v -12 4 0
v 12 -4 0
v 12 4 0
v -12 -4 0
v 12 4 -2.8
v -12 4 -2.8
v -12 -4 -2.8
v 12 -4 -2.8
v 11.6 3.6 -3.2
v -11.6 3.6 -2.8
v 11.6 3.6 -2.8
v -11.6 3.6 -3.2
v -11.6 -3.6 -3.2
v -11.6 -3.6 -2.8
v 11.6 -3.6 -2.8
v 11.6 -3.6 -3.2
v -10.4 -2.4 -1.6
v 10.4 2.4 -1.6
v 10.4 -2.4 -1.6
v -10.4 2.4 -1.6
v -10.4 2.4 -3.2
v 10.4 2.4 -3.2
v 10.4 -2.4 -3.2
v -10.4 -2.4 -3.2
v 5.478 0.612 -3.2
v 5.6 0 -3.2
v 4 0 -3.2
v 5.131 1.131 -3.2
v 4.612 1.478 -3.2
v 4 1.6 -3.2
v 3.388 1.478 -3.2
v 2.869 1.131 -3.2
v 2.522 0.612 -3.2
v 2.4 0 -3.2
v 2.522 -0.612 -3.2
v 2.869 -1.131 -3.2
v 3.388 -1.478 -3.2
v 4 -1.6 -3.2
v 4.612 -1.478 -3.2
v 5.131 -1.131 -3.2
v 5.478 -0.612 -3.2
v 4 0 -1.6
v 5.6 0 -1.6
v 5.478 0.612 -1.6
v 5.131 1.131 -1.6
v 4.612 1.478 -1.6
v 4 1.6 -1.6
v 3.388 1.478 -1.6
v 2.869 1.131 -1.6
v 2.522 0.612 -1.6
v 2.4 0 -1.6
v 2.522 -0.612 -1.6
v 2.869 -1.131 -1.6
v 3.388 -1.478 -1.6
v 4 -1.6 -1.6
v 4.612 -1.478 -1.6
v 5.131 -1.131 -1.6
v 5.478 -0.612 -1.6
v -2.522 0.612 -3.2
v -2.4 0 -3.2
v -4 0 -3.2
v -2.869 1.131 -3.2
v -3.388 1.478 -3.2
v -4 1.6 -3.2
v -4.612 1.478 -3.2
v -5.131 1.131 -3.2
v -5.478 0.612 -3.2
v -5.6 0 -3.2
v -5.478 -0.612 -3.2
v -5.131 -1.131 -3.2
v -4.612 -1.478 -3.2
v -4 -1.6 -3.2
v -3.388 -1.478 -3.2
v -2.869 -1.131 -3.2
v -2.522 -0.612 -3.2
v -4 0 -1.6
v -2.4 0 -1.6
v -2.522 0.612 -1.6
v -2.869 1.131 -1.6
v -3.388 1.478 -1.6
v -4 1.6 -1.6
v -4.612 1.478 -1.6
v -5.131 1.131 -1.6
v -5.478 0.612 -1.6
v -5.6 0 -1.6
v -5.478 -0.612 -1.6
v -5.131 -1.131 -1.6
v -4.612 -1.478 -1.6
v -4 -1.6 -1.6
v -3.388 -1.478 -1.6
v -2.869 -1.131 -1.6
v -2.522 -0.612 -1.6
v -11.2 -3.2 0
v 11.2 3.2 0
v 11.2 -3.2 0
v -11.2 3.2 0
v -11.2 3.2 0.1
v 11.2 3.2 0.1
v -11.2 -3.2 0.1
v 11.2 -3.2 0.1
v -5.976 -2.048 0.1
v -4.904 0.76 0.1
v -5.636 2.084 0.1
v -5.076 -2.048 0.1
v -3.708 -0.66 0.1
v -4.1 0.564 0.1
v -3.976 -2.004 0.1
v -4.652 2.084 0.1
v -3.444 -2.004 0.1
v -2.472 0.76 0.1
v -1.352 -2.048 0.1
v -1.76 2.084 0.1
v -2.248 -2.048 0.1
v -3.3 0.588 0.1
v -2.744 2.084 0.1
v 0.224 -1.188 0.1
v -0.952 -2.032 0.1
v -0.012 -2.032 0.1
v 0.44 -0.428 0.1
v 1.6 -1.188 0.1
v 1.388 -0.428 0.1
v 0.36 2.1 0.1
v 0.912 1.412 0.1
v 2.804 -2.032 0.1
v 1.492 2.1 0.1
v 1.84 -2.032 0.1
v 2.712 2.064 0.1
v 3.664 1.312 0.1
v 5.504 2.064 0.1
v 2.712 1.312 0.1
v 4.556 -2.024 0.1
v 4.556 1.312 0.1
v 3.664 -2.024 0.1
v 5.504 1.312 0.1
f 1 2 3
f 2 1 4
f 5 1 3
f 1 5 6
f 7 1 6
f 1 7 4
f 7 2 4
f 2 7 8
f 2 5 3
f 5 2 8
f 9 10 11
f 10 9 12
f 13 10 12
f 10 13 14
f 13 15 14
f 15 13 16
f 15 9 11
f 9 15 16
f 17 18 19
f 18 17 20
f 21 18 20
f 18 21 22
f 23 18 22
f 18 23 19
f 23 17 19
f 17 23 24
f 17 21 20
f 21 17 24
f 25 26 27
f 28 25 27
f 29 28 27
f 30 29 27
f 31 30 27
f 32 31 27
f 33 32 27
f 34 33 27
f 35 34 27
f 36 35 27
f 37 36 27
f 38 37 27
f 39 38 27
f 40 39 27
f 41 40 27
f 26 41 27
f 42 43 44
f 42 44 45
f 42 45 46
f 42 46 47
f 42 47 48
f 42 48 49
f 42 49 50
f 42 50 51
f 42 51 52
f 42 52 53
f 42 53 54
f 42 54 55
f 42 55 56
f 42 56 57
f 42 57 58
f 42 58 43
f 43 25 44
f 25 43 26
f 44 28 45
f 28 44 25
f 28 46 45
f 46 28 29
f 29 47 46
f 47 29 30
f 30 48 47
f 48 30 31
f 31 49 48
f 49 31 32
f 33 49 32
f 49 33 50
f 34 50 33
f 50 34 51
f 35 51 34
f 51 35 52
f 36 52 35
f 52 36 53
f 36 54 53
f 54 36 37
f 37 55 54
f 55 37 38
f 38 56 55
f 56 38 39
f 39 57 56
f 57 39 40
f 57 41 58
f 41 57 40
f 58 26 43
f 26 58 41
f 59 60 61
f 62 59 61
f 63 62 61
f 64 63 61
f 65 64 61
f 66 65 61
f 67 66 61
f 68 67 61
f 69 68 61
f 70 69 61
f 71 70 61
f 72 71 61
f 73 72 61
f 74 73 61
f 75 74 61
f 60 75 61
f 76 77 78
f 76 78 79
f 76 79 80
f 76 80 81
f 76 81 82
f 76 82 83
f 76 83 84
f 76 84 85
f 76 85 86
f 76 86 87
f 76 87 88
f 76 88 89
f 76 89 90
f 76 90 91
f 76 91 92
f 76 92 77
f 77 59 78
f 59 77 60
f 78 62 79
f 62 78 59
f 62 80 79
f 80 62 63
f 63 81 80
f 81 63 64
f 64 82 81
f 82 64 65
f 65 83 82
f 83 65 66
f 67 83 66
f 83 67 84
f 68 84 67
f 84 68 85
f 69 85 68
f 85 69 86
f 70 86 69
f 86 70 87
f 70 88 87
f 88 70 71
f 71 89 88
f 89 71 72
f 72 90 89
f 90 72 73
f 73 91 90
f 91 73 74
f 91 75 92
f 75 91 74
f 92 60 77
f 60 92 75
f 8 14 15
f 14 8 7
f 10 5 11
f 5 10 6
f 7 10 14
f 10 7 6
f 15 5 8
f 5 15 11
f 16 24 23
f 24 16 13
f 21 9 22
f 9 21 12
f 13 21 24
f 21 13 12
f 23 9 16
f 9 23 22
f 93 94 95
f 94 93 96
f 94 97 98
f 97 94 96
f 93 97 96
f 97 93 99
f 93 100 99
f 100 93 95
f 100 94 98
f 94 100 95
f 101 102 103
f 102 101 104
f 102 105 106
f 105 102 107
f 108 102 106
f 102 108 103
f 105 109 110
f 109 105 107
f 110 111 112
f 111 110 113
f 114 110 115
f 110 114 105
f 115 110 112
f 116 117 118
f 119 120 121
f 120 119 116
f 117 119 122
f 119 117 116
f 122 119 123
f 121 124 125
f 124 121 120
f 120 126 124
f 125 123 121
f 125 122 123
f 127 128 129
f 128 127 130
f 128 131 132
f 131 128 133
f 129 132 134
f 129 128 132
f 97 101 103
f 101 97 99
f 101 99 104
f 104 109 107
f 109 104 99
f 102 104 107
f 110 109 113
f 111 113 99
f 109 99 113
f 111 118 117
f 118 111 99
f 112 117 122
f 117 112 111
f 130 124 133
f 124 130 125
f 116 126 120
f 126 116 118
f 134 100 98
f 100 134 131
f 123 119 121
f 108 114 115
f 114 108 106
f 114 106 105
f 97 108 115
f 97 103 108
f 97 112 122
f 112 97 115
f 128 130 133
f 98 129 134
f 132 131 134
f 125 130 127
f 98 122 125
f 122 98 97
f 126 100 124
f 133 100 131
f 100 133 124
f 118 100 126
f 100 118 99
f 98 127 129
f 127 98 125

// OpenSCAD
// file: ../p/4-4edge.scad
use <../lib.scad>
function ldraw_lib__4_4edge() = [
// 0 Circle 1.0
// 0 Name: 4-4edge.dat
// 0 Author: James Jessiman
// 0 !LDRAW_ORG Primitive UPDATE 2017-01
// 0 !LICENSE Licensed under CC BY 2.0 and CC BY 4.0 : see CAreadme.txt
// 
// 0 BFC CERTIFY CCW
  [0,"BFC","CERTIFY"],
  [0,"BFC","CCW"],
// 
// 0 !HISTORY 1998-12-15 [PTadmin] Official Update 1998-10
// 0 !HISTORY 2005-12-28 [PTadmin] Official Update 2005-01
// 0 !HISTORY 2007-06-24 [PTadmin] Header formatted for Contributor Agreement
// 0 !HISTORY 2008-07-01 [PTadmin] Official Update 2008-01
// 0 !HISTORY 2017-01-15 [Steffen] BFCed
// 0 !HISTORY 2017-12-30 [PTadmin] Official Update 2017-01
// 
// 
// 2 24 1 0 0 0.9239 0 0.3827
  [2,24,1,0,0,0.9239,0,0.3827],
// 2 24 0.9239 0 0.3827 0.7071 0 0.7071
  [2,24,0.9239,0,0.3827,0.7071,0,0.7071],
// 2 24 0.7071 0 0.7071 0.3827 0 0.9239
  [2,24,0.7071,0,0.7071,0.3827,0,0.9239],
// 2 24 0.3827 0 0.9239 0 0 1
  [2,24,0.3827,0,0.9239,0,0,1],
// 2 24 0 0 1 -0.3827 0 0.9239
  [2,24,0,0,1,-0.3827,0,0.9239],
// 2 24 -0.3827 0 0.9239 -0.7071 0 0.7071
  [2,24,-0.3827,0,0.9239,-0.7071,0,0.7071],
// 2 24 -0.7071 0 0.7071 -0.9239 0 0.3827
  [2,24,-0.7071,0,0.7071,-0.9239,0,0.3827],
// 2 24 -0.9239 0 0.3827 -1 0 -0
  [2,24,-0.9239,0,0.3827,-1,0,-0],
// 2 24 -1 0 -0 -0.9239 0 -0.3827
  [2,24,-1,0,-0,-0.9239,0,-0.3827],
// 2 24 -0.9239 0 -0.3827 -0.7071 0 -0.7071
  [2,24,-0.9239,0,-0.3827,-0.7071,0,-0.7071],
// 2 24 -0.7071 0 -0.7071 -0.3827 0 -0.9239
  [2,24,-0.7071,0,-0.7071,-0.3827,0,-0.9239],
// 2 24 -0.3827 0 -0.9239 0 0 -1
  [2,24,-0.3827,0,-0.9239,0,0,-1],
// 2 24 0 0 -1 0.3827 0 -0.9239
  [2,24,0,0,-1,0.3827,0,-0.9239],
// 2 24 0.3827 0 -0.9239 0.7071 0 -0.7071
  [2,24,0.3827,0,-0.9239,0.7071,0,-0.7071],
// 2 24 0.7071 0 -0.7071 0.9239 0 -0.3827
  [2,24,0.7071,0,-0.7071,0.9239,0,-0.3827],
// 2 24 0.9239 0 -0.3827 1 0 0
  [2,24,0.9239,0,-0.3827,1,0,0],
];
module ldraw_lib__4_4edge(step=0, col=false, unit=2/5, alt=false, line=0.2, solid=!$preview)
    makepoly(ldraw_lib__4_4edge(), step=step, col=col, unit=unit, alt=alt, line=line, solid=solid);
ldraw_lib__4_4edge(line=0.2);
// file: ../p/4-4disc.scad
use <../lib.scad>
function ldraw_lib__4_4disc() = [
// 0 Disc 1.0
// 0 Name: 4-4disc.dat
// 0 Author: James Jessiman
// 0 !LDRAW_ORG Primitive UPDATE 2002-02
// 0 !LICENSE Licensed under CC BY 2.0 and CC BY 4.0 : see CAreadme.txt
// 
// 0 BFC CERTIFY CCW
  [0,"BFC","CERTIFY"],
  [0,"BFC","CCW"],
// 
// 0 !HISTORY 1998-12-15 [PTadmin] Official Update 1998-10
// 0 !HISTORY 2002-03-23 [sbliss] Added BFC statement
// 0 !HISTORY 2002-04-25 [PTadmin] Official Update 2002-02
// 0 !HISTORY 2007-06-24 [PTadmin] Header formatted for Contributor Agreement
// 0 !HISTORY 2008-07-01 [PTadmin] Official Update 2008-01
// 
// 
// 3 16 0 0 0 1 0 0 0.9239 0 0.3827
  [3,16,0,0,0,1,0,0,0.9239,0,0.3827],
// 3 16 0 0 0 0.9239 0 0.3827 0.7071 0 0.7071
  [3,16,0,0,0,0.9239,0,0.3827,0.7071,0,0.7071],
// 3 16 0 0 0 0.7071 0 0.7071 0.3827 0 0.9239
  [3,16,0,0,0,0.7071,0,0.7071,0.3827,0,0.9239],
// 3 16 0 0 0 0.3827 0 0.9239 0 0 1
  [3,16,0,0,0,0.3827,0,0.9239,0,0,1],
// 3 16 0 0 0 0 0 1 -0.3827 0 0.9239
  [3,16,0,0,0,0,0,1,-0.3827,0,0.9239],
// 3 16 0 0 0 -0.3827 0 0.9239 -0.7071 0 0.7071
  [3,16,0,0,0,-0.3827,0,0.9239,-0.7071,0,0.7071],
// 3 16 0 0 0 -0.7071 0 0.7071 -0.9239 0 0.3827
  [3,16,0,0,0,-0.7071,0,0.7071,-0.9239,0,0.3827],
// 3 16 0 0 0 -0.9239 0 0.3827 -1 0 -0
  [3,16,0,0,0,-0.9239,0,0.3827,-1,0,-0],
// 3 16 0 0 0 -1 0 -0 -0.9239 0 -0.3827
  [3,16,0,0,0,-1,0,-0,-0.9239,0,-0.3827],
// 3 16 0 0 0 -0.9239 0 -0.3827 -0.7071 0 -0.7071
  [3,16,0,0,0,-0.9239,0,-0.3827,-0.7071,0,-0.7071],
// 3 16 0 0 0 -0.7071 0 -0.7071 -0.3827 0 -0.9239
  [3,16,0,0,0,-0.7071,0,-0.7071,-0.3827,0,-0.9239],
// 3 16 0 0 0 -0.3827 0 -0.9239 0 0 -1
  [3,16,0,0,0,-0.3827,0,-0.9239,0,0,-1],
// 3 16 0 0 0 0 0 -1 0.3827 0 -0.9239
  [3,16,0,0,0,0,0,-1,0.3827,0,-0.9239],
// 3 16 0 0 0 0.3827 0 -0.9239 0.7071 0 -0.7071
  [3,16,0,0,0,0.3827,0,-0.9239,0.7071,0,-0.7071],
// 3 16 0 0 0 0.7071 0 -0.7071 0.9239 0 -0.3827
  [3,16,0,0,0,0.7071,0,-0.7071,0.9239,0,-0.3827],
// 3 16 0 0 0 0.9239 0 -0.3827 1 0 0
  [3,16,0,0,0,0.9239,0,-0.3827,1,0,0],
// 0
];
module ldraw_lib__4_4disc(step=0, col=false, unit=2/5, alt=false, line=0.2, solid=!$preview)
    makepoly(ldraw_lib__4_4disc(), step=step, col=col, unit=unit, alt=alt, line=line, solid=solid);
ldraw_lib__4_4disc(line=0.2);
// file: ../p/4-4cyli.scad
use <../lib.scad>
$fa=1; $fs=0.2;
function ldraw_lib__4_4cyli(realsolid=false) = [
// 0 Cylinder 1.0
// 0 Name: 4-4cyli.dat
// 0 Author: James Jessiman
// 0 !LDRAW_ORG Primitive UPDATE 2005-01
// 0 !LICENSE Licensed under CC BY 2.0 and CC BY 4.0 : see CAreadme.txt
// 
// 0 BFC CERTIFY CCW
  [0,"BFC","CERTIFY"],
  [0,"BFC","CCW"],
// 
// 0 !HISTORY 1998-12-15 [PTadmin] Official Update 1998-10
// 0 !HISTORY 2002-03-23 [sbliss] Added BFC statement; merged headers from files in distributions LDraw 0.27 and Complete.
// 0 !HISTORY 2002-04-25 [PTadmin] Official Update 2002-02
// 0 !HISTORY 2004-12-14 [guyvivan] BFC CCW
// 0 !HISTORY 2005-12-28 [PTadmin] Official Update 2005-01
// 0 !HISTORY 2007-06-24 [PTadmin] Header formatted for Contributor Agreement
// 0 !HISTORY 2008-07-01 [PTadmin] Official Update 2008-01
// 
// 
// 4 16 1 1 0 0.9239 1 0.3827 0.9239 0 0.3827 1 0 0
  [4,16,1,1,0,0.9239,1,0.3827,0.9239,0,0.3827,1,0,0],
// 5 24 1 0 0 1 1 0 0.9239 0 0.3827 0.9239 0 -0.3827
  [5,24,1,0,0,1,1,0,0.9239,0,0.3827,0.9239,0,-0.3827],
// 4 16 0.9239 1 0.3827 0.7071 1 0.7071 0.7071 0 0.7071 0.9239 0 0.3827
  [4,16,0.9239,1,0.3827,0.7071,1,0.7071,0.7071,0,0.7071,0.9239,0,0.3827],
// 5 24 0.9239 0 0.3827 0.9239 1 0.3827 0.7071 0 0.7071 1 0 0
  [5,24,0.9239,0,0.3827,0.9239,1,0.3827,0.7071,0,0.7071,1,0,0],
// 4 16 0.7071 1 0.7071 0.3827 1 0.9239 0.3827 0 0.9239 0.7071 0 0.7071
  [4,16,0.7071,1,0.7071,0.3827,1,0.9239,0.3827,0,0.9239,0.7071,0,0.7071],
// 5 24 0.7071 0 0.7071 0.7071 1 0.7071 0.3827 0 0.9239 0.9239 0 0.3827
  [5,24,0.7071,0,0.7071,0.7071,1,0.7071,0.3827,0,0.9239,0.9239,0,0.3827],
// 4 16 0.3827 1 0.9239 0 1 1 0 0 1 0.3827 0 0.9239
  [4,16,0.3827,1,0.9239,0,1,1,0,0,1,0.3827,0,0.9239],
// 5 24 0.3827 0 0.9239 0.3827 1 0.9239 0 0 1 0.7071 0 0.7071
  [5,24,0.3827,0,0.9239,0.3827,1,0.9239,0,0,1,0.7071,0,0.7071],
// 4 16 0 1 1 -0.3827 1 0.9239 -0.3827 0 0.9239 0 0 1
  [4,16,0,1,1,-0.3827,1,0.9239,-0.3827,0,0.9239,0,0,1],
// 5 24 0 0 1 0 1 1 -0.3827 0 0.9239 0.3827 0 0.9239
  [5,24,0,0,1,0,1,1,-0.3827,0,0.9239,0.3827,0,0.9239],
// 4 16 -0.3827 1 0.9239 -0.7071 1 0.7071 -0.7071 0 0.7071 -0.3827 0 0.9239
  [4,16,-0.3827,1,0.9239,-0.7071,1,0.7071,-0.7071,0,0.7071,-0.3827,0,0.9239],
// 5 24 -0.3827 0 0.9239 -0.3827 1 0.9239 -0.7071 0 0.7071 0 0 1
  [5,24,-0.3827,0,0.9239,-0.3827,1,0.9239,-0.7071,0,0.7071,0,0,1],
// 4 16 -0.7071 1 0.7071 -0.9239 1 0.3827 -0.9239 0 0.3827 -0.7071 0 0.7071
  [4,16,-0.7071,1,0.7071,-0.9239,1,0.3827,-0.9239,0,0.3827,-0.7071,0,0.7071],
// 5 24 -0.7071 0 0.7071 -0.7071 1 0.7071 -0.9239 0 0.3827 -0.3827 0 0.9239
  [5,24,-0.7071,0,0.7071,-0.7071,1,0.7071,-0.9239,0,0.3827,-0.3827,0,0.9239],
// 4 16 -0.9239 1 0.3827 -1 1 0 -1 0 0 -0.9239 0 0.3827
  [4,16,-0.9239,1,0.3827,-1,1,0,-1,0,0,-0.9239,0,0.3827],
// 5 24 -0.9239 0 0.3827 -0.9239 1 0.3827 -1 0 0 -0.7071 0 0.7071
  [5,24,-0.9239,0,0.3827,-0.9239,1,0.3827,-1,0,0,-0.7071,0,0.7071],
// 4 16 -1 1 0 -0.9239 1 -0.3827 -0.9239 0 -0.3827 -1 0 0
  [4,16,-1,1,0,-0.9239,1,-0.3827,-0.9239,0,-0.3827,-1,0,0],
// 5 24 -1 0 0 -1 1 0 -0.9239 0 -0.3827 -0.9239 0 0.3827
  [5,24,-1,0,0,-1,1,0,-0.9239,0,-0.3827,-0.9239,0,0.3827],
// 4 16 -0.9239 1 -0.3827 -0.7071 1 -0.7071 -0.7071 0 -0.7071 -0.9239 0 -0.3827
  [4,16,-0.9239,1,-0.3827,-0.7071,1,-0.7071,-0.7071,0,-0.7071,-0.9239,0,-0.3827],
// 5 24 -0.9239 0 -0.3827 -0.9239 1 -0.3827 -0.7071 0 -0.7071 -1 0 0
  [5,24,-0.9239,0,-0.3827,-0.9239,1,-0.3827,-0.7071,0,-0.7071,-1,0,0],
// 4 16 -0.7071 1 -0.7071 -0.3827 1 -0.9239 -0.3827 0 -0.9239 -0.7071 0 -0.7071
  [4,16,-0.7071,1,-0.7071,-0.3827,1,-0.9239,-0.3827,0,-0.9239,-0.7071,0,-0.7071],
// 5 24 -0.7071 0 -0.7071 -0.7071 1 -0.7071 -0.3827 0 -0.9239 -0.9239 0 -0.3827
  [5,24,-0.7071,0,-0.7071,-0.7071,1,-0.7071,-0.3827,0,-0.9239,-0.9239,0,-0.3827],
// 4 16 -0.3827 1 -0.9239 0 1 -1 0 0 -1 -0.3827 0 -0.9239
  [4,16,-0.3827,1,-0.9239,0,1,-1,0,0,-1,-0.3827,0,-0.9239],
// 5 24 -0.3827 0 -0.9239 -0.3827 1 -0.9239 0 0 -1 -0.7071 0 -0.7071
  [5,24,-0.3827,0,-0.9239,-0.3827,1,-0.9239,0,0,-1,-0.7071,0,-0.7071],
// 4 16 0 1 -1 0.3827 1 -0.9239 0.3827 0 -0.9239 0 0 -1
  [4,16,0,1,-1,0.3827,1,-0.9239,0.3827,0,-0.9239,0,0,-1],
// 5 24 0 0 -1 0 1 -1 0.3827 0 -0.9239 -0.3827 0 -0.9239
  [5,24,0,0,-1,0,1,-1,0.3827,0,-0.9239,-0.3827,0,-0.9239],
// 4 16 0.3827 1 -0.9239 0.7071 1 -0.7071 0.7071 0 -0.7071 0.3827 0 -0.9239
  [4,16,0.3827,1,-0.9239,0.7071,1,-0.7071,0.7071,0,-0.7071,0.3827,0,-0.9239],
// 5 24 0.3827 0 -0.9239 0.3827 1 -0.9239 0.7071 0 -0.7071 0 0 -1
  [5,24,0.3827,0,-0.9239,0.3827,1,-0.9239,0.7071,0,-0.7071,0,0,-1],
// 4 16 0.7071 1 -0.7071 0.9239 1 -0.3827 0.9239 0 -0.3827 0.7071 0 -0.7071
  [4,16,0.7071,1,-0.7071,0.9239,1,-0.3827,0.9239,0,-0.3827,0.7071,0,-0.7071],
// 5 24 0.7071 0 -0.7071 0.7071 1 -0.7071 0.9239 0 -0.3827 0.3827 0 -0.9239
  [5,24,0.7071,0,-0.7071,0.7071,1,-0.7071,0.9239,0,-0.3827,0.3827,0,-0.9239],
// 4 16 0.9239 1 -0.3827 1 1 0 1 0 0 0.9239 0 -0.3827
  [4,16,0.9239,1,-0.3827,1,1,0,1,0,0,0.9239,0,-0.3827],
// 5 24 0.9239 0 -0.3827 0.9239 1 -0.3827 1 0 0 0.7071 0 -0.7071
  [5,24,0.9239,0,-0.3827,0.9239,1,-0.3827,1,0,0,0.7071,0,-0.7071],
// 0
];
module ldraw_lib__4_4cyli(step=0, col=false, unit=2/5, alt=false, line=0.2, solid=!$preview)
    makepoly(ldraw_lib__4_4cyli(solid), step=step, col=col, unit=unit, alt=alt, line=line, solid=solid);
ldraw_lib__4_4cyli(line=0.2);
// file: ../p/stud3.scad
use <../lib.scad>
use <4-4cyli.scad>
use <4-4disc.scad>
use <4-4edge.scad>
function ldraw_lib__stud3() = [
// 0 Stud Tube Solid
// 0 Name: stud3.dat
// 0 Author: James Jessiman
// 0 !LDRAW_ORG Primitive UPDATE 2012-01
// 0 !LICENSE Licensed under CC BY 4.0 : see CAreadme.txt
// 
// 0 BFC CERTIFY CCW
  [0,"BFC","CERTIFY"],
  [0,"BFC","CCW"],
// 
// 0 !HISTORY 2002-04-04 [sbliss] Modified for BFC compliance
// 0 !HISTORY 2002-04-25 [PTadmin] Official Update 2002-02
// 0 !HISTORY 2007-06-24 [PTadmin] Header formatted for Contributor Agreement
// 0 !HISTORY 2008-07-01 [PTadmin] Official Update 2008-01
// 0 !HISTORY 2012-02-16 [Philo] Changed to CCW
// 0 !HISTORY 2012-03-30 [PTadmin] Official Update 2012-01
// 
// 
// 1 16 0 -4 0 4 0 0 0 1 0 0 0 4 4-4edge.dat
  [1,16,0,-4,0,4,0,0,0,1,0,0,0,4, ldraw_lib__4_4edge()],
// 1 16 0 0 0 4 0 0 0 1 0 0 0 4 4-4edge.dat
  [1,16,0,0,0,4,0,0,0,1,0,0,0,4, ldraw_lib__4_4edge()],
// 1 16 0 -4 0 4 0 0 0 1 0 0 0 4 4-4disc.dat
  [1,16,0,-4,0,4,0,0,0,1,0,0,0,4, ldraw_lib__4_4disc()],
  [-1,16,0,0,0,4,0,0,0,-1,0,0,0,4, ldraw_lib__4_4disc()],
// 1 16 0 -4 0 4 0 0 0 4 0 0 0 4 4-4cyli.dat
  [1,16,0,-4,0,4,0,0,0,4,0,0,0,4, ldraw_lib__4_4cyli()],
];
module ldraw_lib__stud3(step=0, col=false, unit=2/5, alt=false, line=0.2, solid=!$preview)
    makepoly(ldraw_lib__stud3(), step=step, col=col, unit=unit, alt=alt, line=line, solid=solid);
ldraw_lib__stud3(line=0.2);
// file: ../p/box5.scad
use <../lib.scad>
function ldraw_lib__box5() = [
// 0 Box with 5 Faces and All Edges
// 0 Name: box5.dat
// 0 Author: James Jessiman
// 0 !LDRAW_ORG Primitive UPDATE 2012-01
// 0 !LICENSE Licensed under CC BY 2.0 and CC BY 4.0 : see CAreadme.txt
// 
// 0 BFC CERTIFY CCW
  [0,"BFC","CERTIFY"],
  [0,"BFC","CCW"],
// 
// 0 !HISTORY 2002-04-03 [sbliss] Modified for BFC compliance
// 0 !HISTORY 2002-04-25 [PTadmin] Official Update 2002-02
// 0 !HISTORY 2007-06-24 [PTadmin] Header formatted for Contributor Agreement
// 0 !HISTORY 2008-07-01 [PTadmin] Official Update 2008-01
// 0 !HISTORY 2012-02-16 [Philo] Changed to CCW
// 0 !HISTORY 2012-03-30 [PTadmin] Official Update 2012-01
// 
// 
// 2 24 1 1 1 -1 1 1
  [2,24,1,1,1,-1,1,1],
// 2 24 -1 1 1 -1 1 -1
  [2,24,-1,1,1,-1,1,-1],
// 2 24 -1 1 -1 1 1 -1
  [2,24,-1,1,-1,1,1,-1],
// 2 24 1 1 -1 1 1 1
  [2,24,1,1,-1,1,1,1],
// 2 24 1 0 1 -1 0 1
  [2,24,1,0,1,-1,0,1],
// 2 24 -1 0 1 -1 0 -1
  [2,24,-1,0,1,-1,0,-1],
// 2 24 -1 0 -1 1 0 -1
  [2,24,-1,0,-1,1,0,-1],
// 2 24 1 0 -1 1 0 1
  [2,24,1,0,-1,1,0,1],
// 2 24 1 0 1 1 1 1
  [2,24,1,0,1,1,1,1],
// 2 24 -1 0 1 -1 1 1
  [2,24,-1,0,1,-1,1,1],
// 2 24 1 0 -1 1 1 -1
  [2,24,1,0,-1,1,1,-1],
// 2 24 -1 0 -1 -1 1 -1
  [2,24,-1,0,-1,-1,1,-1],
// 4 16 -1 1 1 1 1 1 1 1 -1 -1 1 -1
  [4,16,-1,1,1,1,1,1,1,1,-1,-1,1,-1],
// 4 16 -1 1 1 -1 0 1 1 0 1 1 1 1
  [4,16,-1,1,1,-1,0,1,1,0,1,1,1,1],
// 4 16 -1 1 -1 -1 0 -1 -1 0 1 -1 1 1
  [4,16,-1,1,-1,-1,0,-1,-1,0,1,-1,1,1],
// 4 16 1 1 -1 1 0 -1 -1 0 -1 -1 1 -1
  [4,16,1,1,-1,1,0,-1,-1,0,-1,-1,1,-1],
// 4 16 1 1 1 1 0 1 1 0 -1 1 1 -1
  [4,16,1,1,1,1,0,1,1,0,-1,1,1,-1],
];
makepoly(ldraw_lib__box5(), line=0.2);
// file: ../p/box4.scad
use <../lib.scad>
function ldraw_lib__box4() = [
// 0 Box with 4 Faces (2 Parallel Pairs) and All Edges
// 0 Name: box4.dat
// 0 Author: James Jessiman
// 0 !LDRAW_ORG Primitive UPDATE 2012-01
// 0 !LICENSE Licensed under CC BY 4.0 : see CAreadme.txt
// 
// 0 BFC CERTIFY CCW
  [0,"BFC","CERTIFY"],
  [0,"BFC","CCW"],
// 
// 0 !HISTORY 2002-04-03 [sbliss] Modified for BFC compliance
// 0 !HISTORY 2002-04-25 [PTadmin] Official Update 2002-02
// 0 !HISTORY 2007-06-24 [PTadmin] Header formatted for Contributor Agreement
// 0 !HISTORY 2008-07-01 [PTadmin] Official Update 2008-01
// 0 !HISTORY 2012-02-16 [Philo] Changed to CCW
// 0 !HISTORY 2012-03-30 [PTadmin] Official Update 2012-01
// 
// 
// 2 24 1 1 1 -1 1 1
  [2,24,1,1,1,-1,1,1],
// 2 24 -1 1 1 -1 1 -1
  [2,24,-1,1,1,-1,1,-1],
// 2 24 -1 1 -1 1 1 -1
  [2,24,-1,1,-1,1,1,-1],
// 2 24 1 1 -1 1 1 1
  [2,24,1,1,-1,1,1,1],
// 2 24 1 0 1 -1 0 1
  [2,24,1,0,1,-1,0,1],
// 2 24 -1 0 1 -1 0 -1
  [2,24,-1,0,1,-1,0,-1],
// 2 24 -1 0 -1 1 0 -1
  [2,24,-1,0,-1,1,0,-1],
// 2 24 1 0 -1 1 0 1
  [2,24,1,0,-1,1,0,1],
// 2 24 1 0 1 1 1 1
  [2,24,1,0,1,1,1,1],
// 2 24 -1 0 1 -1 1 1
  [2,24,-1,0,1,-1,1,1],
// 2 24 1 0 -1 1 1 -1
  [2,24,1,0,-1,1,1,-1],
// 2 24 -1 0 -1 -1 1 -1
  [2,24,-1,0,-1,-1,1,-1],
// 4 16 -1 1 1 -1 0 1 1 0 1 1 1 1
  [4,16,-1,1,1,-1,0,1,1,0,1,1,1,1],
// 4 16 -1 1 -1 -1 0 -1 -1 0 1 -1 1 1
  [4,16,-1,1,-1,-1,0,-1,-1,0,1,-1,1,1],
// 4 16 1 1 -1 1 0 -1 -1 0 -1 -1 1 -1
  [4,16,1,1,-1,1,0,-1,-1,0,-1,-1,1,-1],
// 4 16 1 1 1 1 0 1 1 0 -1 1 1 -1
  [4,16,1,1,1,1,0,1,1,0,-1,1,1,-1],
];
module ldraw_lib__box4(step=0, col=false, unit=2/5, alt=false, line=0.2, solid=!$preview)
    makepoly(ldraw_lib__box4(), step=step, col=col, unit=unit, alt=alt, line=line, solid=solid);
ldraw_lib__box4(line=0.2);
// file: s/63864s01.scad
use <../../lib.scad>
use <../../p/box4.scad>
use <../../p/box5.scad>
use <../../p/stud3.scad>
function ldraw_lib__s__63864s01() = [
// 0 ~Tile  1 x  3 without Top Face
// 0 Name: s\63864s01.dat
// 0 Author: Ulrich Röder [UR]
// 0 !LDRAW_ORG Subpart UPDATE 2019-01
// 0 !LICENSE Licensed under CC BY 4.0 : see CAreadme.txt
// 
// 0 BFC CERTIFY CCW
  [0,"BFC","CERTIFY"],
  [0,"BFC","CCW"],
// 
// 0 !HISTORY 2019-06-28 [PTadmin] Official Update 2019-01
// 
// 
// 1 16 0 0 0 30 0 0 0 7 0 0 0 10 box4.dat
  [1,16,0,0,0,30,0,0,0,7,0,0,0,10, ldraw_lib__box4()],
// 1 16 0 7 0 29 0 0 0 1 0 0 0 9 box4.dat
  [1,16,0,7,0,29,0,0,0,1,0,0,0,9, ldraw_lib__box4()],
// 0 BFC INVERTNEXT
  [0,"BFC","INVERTNEXT"],
// 1 16 0 8 0 -26 0 0 0 -4 0 0 0 6 box5.dat
  [1,16,0,8,0,-26,0,0,0,-4,0,0,0,6, ldraw_lib__box5()],
// 1 16 10 4 0 1 0 0 0 -1 0 0 0 1 stud3.dat
  [1,16,10,4,0,1,0,0,0,-1,0,0,0,1, ldraw_lib__stud3()],
// 1 16 -10 4 0 1 0 0 0 -1 0 0 0 1 stud3.dat
  [1,16,-10,4,0,1,0,0,0,-1,0,0,0,1, ldraw_lib__stud3()],
// 4 16 -30 7 -10 -29 7 -9 29 7 -9 30 7 -10
  [4,16,-30,7,-10,-29,7,-9,29,7,-9,30,7,-10],
// 4 16 30 7 10 29 7 9 -29 7 9 -30 7 10
  [4,16,30,7,10,29,7,9,-29,7,9,-30,7,10],
// 4 16 -30 7 -10 -30 7 10 -29 7 9 -29 7 -9
  [4,16,-30,7,-10,-30,7,10,-29,7,9,-29,7,-9],
// 4 16 30 7 10 30 7 -10 29 7 -9 29 7 9
  [4,16,30,7,10,30,7,-10,29,7,-9,29,7,9],
// 4 16 -29 8 -9 -26 8 -6 26 8 -6 29 8 -9
  [4,16,-29,8,-9,-26,8,-6,26,8,-6,29,8,-9],
// 4 16 29 8 9 26 8 6 -26 8 6 -29 8 9
  [4,16,29,8,9,26,8,6,-26,8,6,-29,8,9],
// 4 16 -29 8 -9 -29 8 9 -26 8 6 -26 8 -6
  [4,16,-29,8,-9,-29,8,9,-26,8,6,-26,8,-6],
// 4 16 29 8 9 29 8 -9 26 8 -6 26 8 6
  [4,16,29,8,9,29,8,-9,26,8,-6,26,8,6],
];
module ldraw_lib__s__63864s01(step=0, col=false, unit=2/5, alt=false, line=0.2, solid=!$preview)
    makepoly(ldraw_lib__s__63864s01(), step=step, col=col, unit=unit, alt=alt, line=line, solid=solid);
ldraw_lib__s__63864s01(line=0.2);
// file: ../p/box5-12.scad
use <../lib.scad>
function ldraw_lib__box5_12() = [
// 0 Box with 5 Faces without Any Edges
// 0 Name: box5-12.dat
// 0 Author: Chris Dee [cwdee]
// 0 !LDRAW_ORG Primitive UPDATE 2009-02
// 0 !LICENSE Licensed under CC BY 2.0 and CC BY 4.0 : see CAreadme.txt
// 
// 0 BFC CERTIFY CCW
  [0,"BFC","CERTIFY"],
  [0,"BFC","CCW"],
// 
// 0 !HISTORY 2009-09-03 [PTadmin] Official Update 2009-02
// 
// 
// 4 16 1 1 1 1 1 -1 -1 1 -1 -1 1 1
  [4,16,1,1,1,1,1,-1,-1,1,-1,-1,1,1],
// 4 16 -1 0 1 1 0 1 1 1 1 -1 1 1
  [4,16,-1,0,1,1,0,1,1,1,1,-1,1,1],
// 4 16 -1 0 -1 -1 0 1 -1 1 1 -1 1 -1
  [4,16,-1,0,-1,-1,0,1,-1,1,1,-1,1,-1],
// 4 16 1 0 -1 -1 0 -1 -1 1 -1 1 1 -1
  [4,16,1,0,-1,-1,0,-1,-1,1,-1,1,1,-1],
// 4 16 1 0 1 1 0 -1 1 1 -1 1 1 1
  [4,16,1,0,1,1,0,-1,1,1,-1,1,1,1],
// 0
];
module ldraw_lib__box5_12(step=0, col=false, unit=2/5, alt=false, line=0.2, solid=!$preview)
    makepoly(ldraw_lib__box5_12(), step=step, col=col, unit=unit, alt=alt, line=line, solid=solid);
ldraw_lib__box5_12(line=0.2);
// file: 63864.scad
use <../lib.scad>
use <s/63864s01.scad>
function ldraw_lib__63864() = [
// 0 Tile  1 x  3
// 0 Name: 63864.dat
// 0 Author: Tim Gould [timgould]
// 0 !LDRAW_ORG Part UPDATE 2019-01
// 0 !LICENSE Licensed under CC BY 2.0 and CC BY 4.0 : see CAreadme.txt
// 
// 0 BFC CERTIFY CCW
  [0,"BFC","CERTIFY"],
  [0,"BFC","CCW"],
// 
// 0 !HISTORY 2010-04-05 [PTadmin] Official Update 2010-01
// 0 !HISTORY 2019-06-28 [PTadmin] Official Update 2019-01
// 0 !HISTORY 2019-07-03 [UR] Subpart Integration
// 
// 
// 4 16 -30 0 -10 30 0 -10 30 0 10 -30 0 10
  [4,16,-30,0,-10,30,0,-10,30,0,10,-30,0,10],
// 1 16 0 0 0 1 0 0 0 1 0 0 0 1 s\63864s01.dat
  [1,16,0,0,0,1,0,0,0,1,0,0,0,1, ldraw_lib__s__63864s01()],
];
makepoly(ldraw_lib__63864(), line=0.2);
// file: 6153754g.scad
use <../lib.scad>
use <../p/box5-12.scad>
function ldraw_lib__6153754g() = [
// 0 Sticker  0.8 x  2.8 with White "MAT" on Black Background
// 0 Name: 6153754g.dat
// 0 Author: Magnus Forsberg [MagFors]
// 0 !LDRAW_ORG Part UPDATE 2016-01
// 0 !LICENSE Licensed under CC BY 2.0 and CC BY 4.0 : see CAreadme.txt
// 
// 0 BFC CERTIFY CCW
  [0,"BFC","CERTIFY"],
  [0,"BFC","CCW"],
// 
// 0 !KEYWORDS Beetle, set 10252, Volkswagen, VW
// 
// 0 !HISTORY 2016-12-31 [PTadmin] Official Update 2016-01
// 
// 
// 1 16 0 -0.25 0 28 0 0 0 0.25 0 0 0 8 box5-12.dat
  [1,16,0,-0.25,0,28,0,0,0,0.25,0,0,0,8, ldraw_lib__box5_12()],
// 4 15 -14.94 -0.25 -5.12 -12.69 -0.25 -5.12 -12.26 -0.25 1.9 -14.09 -0.25 5.21
  [4,15,-14.94,-0.25,-5.12,-12.69,-0.25,-5.12,-12.26,-0.25,1.9,-14.09,-0.25,5.21],
// 4 15 -12.26 -0.25 1.9 -9.94 -0.25 -5.01 -9.27 -0.25 -1.65 -10.25 -0.25 1.41
  [4,15,-12.26,-0.25,1.9,-9.94,-0.25,-5.01,-9.27,-0.25,-1.65,-10.25,-0.25,1.41],
// 4 15 -11.63 -0.25 5.21 -14.09 -0.25 5.21 -12.26 -0.25 1.9 -10.25 -0.25 1.41
  [4,15,-11.63,-0.25,5.21,-14.09,-0.25,5.21,-12.26,-0.25,1.9,-10.25,-0.25,1.41],
// 4 15 -9.27 -0.25 -1.65 -9.94 -0.25 -5.01 -8.61 -0.25 -5.01 -6.18 -0.25 1.9
  [4,15,-9.27,-0.25,-1.65,-9.94,-0.25,-5.01,-8.61,-0.25,-5.01,-6.18,-0.25,1.9],
// 4 15 -6.18 -0.25 1.9 -5.62 -0.25 -5.12 -3.38 -0.25 -5.12 -4.4 -0.25 5.21
  [4,15,-6.18,-0.25,1.9,-5.62,-0.25,-5.12,-3.38,-0.25,-5.12,-4.4,-0.25,5.21],
// 4 15 -6.18 -0.25 1.9 -6.86 -0.25 5.21 -8.25 -0.25 1.47 -9.27 -0.25 -1.65
  [4,15,-6.18,-0.25,1.9,-6.86,-0.25,5.21,-8.25,-0.25,1.47,-9.27,-0.25,-1.65],
// 3 15 -6.86 -0.25 5.21 -6.18 -0.25 1.9 -4.4 -0.25 5.21
  [3,15,-6.86,-0.25,5.21,-6.18,-0.25,1.9,-4.4,-0.25,5.21],
// 3 15 0.56 -0.25 -2.97 -2.38 -0.25 -5.08 -0.03 -0.25 -5.08
  [3,15,0.56,-0.25,-2.97,-2.38,-0.25,-5.08,-0.03,-0.25,-5.08],
// 4 15 1.1 -0.25 -1.07 0.56 -0.25 -2.97 4 -0.25 -2.97 3.47 -0.25 -1.07
  [4,15,1.1,-0.25,-1.07,0.56,-0.25,-2.97,4,-0.25,-2.97,3.47,-0.25,-1.07],
// 4 15 -2.38 -0.25 -5.08 0.56 -0.25 -2.97 1.1 -0.25 -1.07 0.9 -0.25 5.25
  [4,15,-2.38,-0.25,-5.08,0.56,-0.25,-2.97,1.1,-0.25,-1.07,0.9,-0.25,5.25],
// 3 15 0.9 -0.25 5.25 1.1 -0.25 -1.07 2.28 -0.25 3.53
  [3,15,0.9,-0.25,5.25,1.1,-0.25,-1.07,2.28,-0.25,3.53],
// 4 15 3.47 -0.25 -1.07 4 -0.25 -2.97 7.01 -0.25 -5.08 3.73 -0.25 5.25
  [4,15,3.47,-0.25,-1.07,4,-0.25,-2.97,7.01,-0.25,-5.08,3.73,-0.25,5.25],
// 3 15 4 -0.25 -2.97 4.6 -0.25 -5.08 7.01 -0.25 -5.08
  [3,15,4,-0.25,-2.97,4.6,-0.25,-5.08,7.01,-0.25,-5.08],
// 3 15 3.73 -0.25 5.25 2.28 -0.25 3.53 3.47 -0.25 -1.07
  [3,15,3.73,-0.25,5.25,2.28,-0.25,3.53,3.47,-0.25,-1.07],
// 3 15 3.73 -0.25 5.25 0.9 -0.25 5.25 2.28 -0.25 3.53
  [3,15,3.73,-0.25,5.25,0.9,-0.25,5.25,2.28,-0.25,3.53],
// 4 15 9.16 -0.25 3.28 13.76 -0.25 5.16 6.78 -0.25 5.16 6.78 -0.25 3.28
  [4,15,9.16,-0.25,3.28,13.76,-0.25,5.16,6.78,-0.25,5.16,6.78,-0.25,3.28],
// 4 15 9.16 -0.25 3.28 9.16 -0.25 -5.06 11.39 -0.25 -5.06 11.39 -0.25 3.28
  [4,15,9.16,-0.25,3.28,9.16,-0.25,-5.06,11.39,-0.25,-5.06,11.39,-0.25,3.28],
// 3 15 13.76 -0.25 5.16 11.39 -0.25 3.28 13.76 -0.25 3.28
  [3,15,13.76,-0.25,5.16,11.39,-0.25,3.28,13.76,-0.25,3.28],
// 3 15 13.76 -0.25 5.16 9.16 -0.25 3.28 11.39 -0.25 3.28
  [3,15,13.76,-0.25,5.16,9.16,-0.25,3.28,11.39,-0.25,3.28],
// 4 0 -28 -0.25 8 -28 -0.25 -8 -14.94 -0.25 -5.12 -14.09 -0.25 5.21
  [4,0,-28,-0.25,8,-28,-0.25,-8,-14.94,-0.25,-5.12,-14.09,-0.25,5.21],
// 3 0 -14.94 -0.25 -5.12 -28 -0.25 -8 -12.69 -0.25 -5.12
  [3,0,-14.94,-0.25,-5.12,-28,-0.25,-8,-12.69,-0.25,-5.12],
// 4 0 -9.94 -0.25 -5.01 -12.69 -0.25 -5.12 -28 -0.25 -8 -8.61 -0.25 -5.01
  [4,0,-9.94,-0.25,-5.01,-12.69,-0.25,-5.12,-28,-0.25,-8,-8.61,-0.25,-5.01],
// 3 0 -12.26 -0.25 1.9 -12.69 -0.25 -5.12 -9.94 -0.25 -5.01
  [3,0,-12.26,-0.25,1.9,-12.69,-0.25,-5.12,-9.94,-0.25,-5.01],
// 3 0 -6.18 -0.25 1.9 -8.61 -0.25 -5.01 -5.62 -0.25 -5.12
  [3,0,-6.18,-0.25,1.9,-8.61,-0.25,-5.01,-5.62,-0.25,-5.12],
// 3 0 -3.38 -0.25 -5.12 -5.62 -0.25 -5.12 -28 -0.25 -8
  [3,0,-3.38,-0.25,-5.12,-5.62,-0.25,-5.12,-28,-0.25,-8],
// 3 0 -8.61 -0.25 -5.01 -28 -0.25 -8 -5.62 -0.25 -5.12
  [3,0,-8.61,-0.25,-5.01,-28,-0.25,-8,-5.62,-0.25,-5.12],
// 4 0 -2.38 -0.25 -5.08 -3.38 -0.25 -5.12 -28 -0.25 -8 -0.03 -0.25 -5.08
  [4,0,-2.38,-0.25,-5.08,-3.38,-0.25,-5.12,-28,-0.25,-8,-0.03,-0.25,-5.08],
// 4 0 -4.4 -0.25 5.21 -3.38 -0.25 -5.12 -2.38 -0.25 -5.08 0.9 -0.25 5.25
  [4,0,-4.4,-0.25,5.21,-3.38,-0.25,-5.12,-2.38,-0.25,-5.08,0.9,-0.25,5.25],
// 4 0 6.78 -0.25 3.28 3.73 -0.25 5.25 7.01 -0.25 -5.08 9.16 -0.25 -5.06
  [4,0,6.78,-0.25,3.28,3.73,-0.25,5.25,7.01,-0.25,-5.08,9.16,-0.25,-5.06],
// 4 0 -0.03 -0.25 -5.08 4.6 -0.25 -5.08 4 -0.25 -2.97 0.56 -0.25 -2.97
  [4,0,-0.03,-0.25,-5.08,4.6,-0.25,-5.08,4,-0.25,-2.97,0.56,-0.25,-2.97],
// 4 0 13.76 -0.25 3.28 11.39 -0.25 -5.06 28 -0.25 -8 28 -0.25 8
  [4,0,13.76,-0.25,3.28,11.39,-0.25,-5.06,28,-0.25,-8,28,-0.25,8],
// 3 0 2.28 -0.25 3.53 1.1 -0.25 -1.07 3.47 -0.25 -1.07
  [3,0,2.28,-0.25,3.53,1.1,-0.25,-1.07,3.47,-0.25,-1.07],
// 4 0 -11.63 -0.25 5.21 -10.25 -0.25 1.41 -8.25 -0.25 1.47 -6.86 -0.25 5.21
  [4,0,-11.63,-0.25,5.21,-10.25,-0.25,1.41,-8.25,-0.25,1.47,-6.86,-0.25,5.21],
// 3 0 -8.25 -0.25 1.47 -10.25 -0.25 1.41 -9.27 -0.25 -1.65
  [3,0,-8.25,-0.25,1.47,-10.25,-0.25,1.41,-9.27,-0.25,-1.65],
// 3 0 -28 -0.25 8 -11.63 -0.25 5.21 -6.86 -0.25 5.21
  [3,0,-28,-0.25,8,-11.63,-0.25,5.21,-6.86,-0.25,5.21],
// 3 0 -28 -0.25 8 -14.09 -0.25 5.21 -11.63 -0.25 5.21
  [3,0,-28,-0.25,8,-14.09,-0.25,5.21,-11.63,-0.25,5.21],
// 4 0 -28 -0.25 8 -6.86 -0.25 5.21 -4.4 -0.25 5.21 0.9 -0.25 5.25
  [4,0,-28,-0.25,8,-6.86,-0.25,5.21,-4.4,-0.25,5.21,0.9,-0.25,5.25],
// 3 0 9.16 -0.25 3.28 6.78 -0.25 3.28 9.16 -0.25 -5.06
  [3,0,9.16,-0.25,3.28,6.78,-0.25,3.28,9.16,-0.25,-5.06],
// 3 0 28 -0.25 8 13.76 -0.25 5.16 13.76 -0.25 3.28
  [3,0,28,-0.25,8,13.76,-0.25,5.16,13.76,-0.25,3.28],
// 3 0 11.39 -0.25 3.28 11.39 -0.25 -5.06 13.76 -0.25 3.28
  [3,0,11.39,-0.25,3.28,11.39,-0.25,-5.06,13.76,-0.25,3.28],
// 3 0 3.73 -0.25 5.25 6.78 -0.25 3.28 6.78 -0.25 5.16
  [3,0,3.73,-0.25,5.25,6.78,-0.25,3.28,6.78,-0.25,5.16],
// 4 0 0.9 -0.25 5.25 3.73 -0.25 5.25 28 -0.25 8 -28 -0.25 8
  [4,0,0.9,-0.25,5.25,3.73,-0.25,5.25,28,-0.25,8,-28,-0.25,8],
// 3 0 4.6 -0.25 -5.08 28 -0.25 -8 7.01 -0.25 -5.08
  [3,0,4.6,-0.25,-5.08,28,-0.25,-8,7.01,-0.25,-5.08],
// 4 0 28 -0.25 -8 11.39 -0.25 -5.06 9.16 -0.25 -5.06 7.01 -0.25 -5.08
  [4,0,28,-0.25,-8,11.39,-0.25,-5.06,9.16,-0.25,-5.06,7.01,-0.25,-5.08],
// 4 0 28 -0.25 -8 4.6 -0.25 -5.08 -0.03 -0.25 -5.08 -28 -0.25 -8
  [4,0,28,-0.25,-8,4.6,-0.25,-5.08,-0.03,-0.25,-5.08,-28,-0.25,-8],
// 4 0 6.78 -0.25 5.16 13.76 -0.25 5.16 28 -0.25 8 3.73 -0.25 5.25
  [4,0,6.78,-0.25,5.16,13.76,-0.25,5.16,28,-0.25,8,3.73,-0.25,5.25],
];
module ldraw_lib__6153754g(step=0, col=false, unit=2/5, alt=false, line=0.2, solid=!$preview)
    makepoly(ldraw_lib__6153754g(), step=step, col=col, unit=unit, alt=alt, line=line, solid=solid);
ldraw_lib__6153754g(line=0.2);
// main file
use <../lib.scad>
use <6153754g.scad>
use <63864.scad>
function ldraw_lib__63864d0d() = [
// 0 Tile  1 x  3 with White "MAT" on Black Background Sticker
// 0 Name: 63864d0d.dat
// 0 Author: Evert-Jan Boer [ejboer]
// 0 !LDRAW_ORG Shortcut UPDATE 2026-07
// 0 !LICENSE Licensed under CC BY 4.0 : see CAreadme.txt
// 
// 0 BFC CERTIFY CCW
  [0,"BFC","CERTIFY"],
  [0,"BFC","CCW"],
// 
// 0 !CATEGORY Sticker Shortcut
// 0 !KEYWORDS Bricklink 63864pb062, set 10252, Volkswagen Beetle
// 
// 0 !HISTORY 2026-07-30 [OrionP] Official Update 2026-07
// 
// 1 16 0 0 0 1 0 0 0 1 0 0 0 1 63864.dat
  [1,16,0,0,0,1,0,0,0,1,0,0,0,1, ldraw_lib__63864()],
// 1 16 0 0 0 1 0 0 0 1 0 0 0 1 6153754g.dat
  [1,16,0,0,0,1,0,0,0,1,0,0,0,1, ldraw_lib__6153754g()],
];
module ldraw_lib__63864d0d(step=0, col=false, unit=2/5, alt=false, line=0.2, solid=!$preview)
    makepoly(ldraw_lib__63864d0d(), step=step, col=col, unit=unit, alt=alt, line=line, solid=solid);
ldraw_lib__63864d0d(line=0.2);
